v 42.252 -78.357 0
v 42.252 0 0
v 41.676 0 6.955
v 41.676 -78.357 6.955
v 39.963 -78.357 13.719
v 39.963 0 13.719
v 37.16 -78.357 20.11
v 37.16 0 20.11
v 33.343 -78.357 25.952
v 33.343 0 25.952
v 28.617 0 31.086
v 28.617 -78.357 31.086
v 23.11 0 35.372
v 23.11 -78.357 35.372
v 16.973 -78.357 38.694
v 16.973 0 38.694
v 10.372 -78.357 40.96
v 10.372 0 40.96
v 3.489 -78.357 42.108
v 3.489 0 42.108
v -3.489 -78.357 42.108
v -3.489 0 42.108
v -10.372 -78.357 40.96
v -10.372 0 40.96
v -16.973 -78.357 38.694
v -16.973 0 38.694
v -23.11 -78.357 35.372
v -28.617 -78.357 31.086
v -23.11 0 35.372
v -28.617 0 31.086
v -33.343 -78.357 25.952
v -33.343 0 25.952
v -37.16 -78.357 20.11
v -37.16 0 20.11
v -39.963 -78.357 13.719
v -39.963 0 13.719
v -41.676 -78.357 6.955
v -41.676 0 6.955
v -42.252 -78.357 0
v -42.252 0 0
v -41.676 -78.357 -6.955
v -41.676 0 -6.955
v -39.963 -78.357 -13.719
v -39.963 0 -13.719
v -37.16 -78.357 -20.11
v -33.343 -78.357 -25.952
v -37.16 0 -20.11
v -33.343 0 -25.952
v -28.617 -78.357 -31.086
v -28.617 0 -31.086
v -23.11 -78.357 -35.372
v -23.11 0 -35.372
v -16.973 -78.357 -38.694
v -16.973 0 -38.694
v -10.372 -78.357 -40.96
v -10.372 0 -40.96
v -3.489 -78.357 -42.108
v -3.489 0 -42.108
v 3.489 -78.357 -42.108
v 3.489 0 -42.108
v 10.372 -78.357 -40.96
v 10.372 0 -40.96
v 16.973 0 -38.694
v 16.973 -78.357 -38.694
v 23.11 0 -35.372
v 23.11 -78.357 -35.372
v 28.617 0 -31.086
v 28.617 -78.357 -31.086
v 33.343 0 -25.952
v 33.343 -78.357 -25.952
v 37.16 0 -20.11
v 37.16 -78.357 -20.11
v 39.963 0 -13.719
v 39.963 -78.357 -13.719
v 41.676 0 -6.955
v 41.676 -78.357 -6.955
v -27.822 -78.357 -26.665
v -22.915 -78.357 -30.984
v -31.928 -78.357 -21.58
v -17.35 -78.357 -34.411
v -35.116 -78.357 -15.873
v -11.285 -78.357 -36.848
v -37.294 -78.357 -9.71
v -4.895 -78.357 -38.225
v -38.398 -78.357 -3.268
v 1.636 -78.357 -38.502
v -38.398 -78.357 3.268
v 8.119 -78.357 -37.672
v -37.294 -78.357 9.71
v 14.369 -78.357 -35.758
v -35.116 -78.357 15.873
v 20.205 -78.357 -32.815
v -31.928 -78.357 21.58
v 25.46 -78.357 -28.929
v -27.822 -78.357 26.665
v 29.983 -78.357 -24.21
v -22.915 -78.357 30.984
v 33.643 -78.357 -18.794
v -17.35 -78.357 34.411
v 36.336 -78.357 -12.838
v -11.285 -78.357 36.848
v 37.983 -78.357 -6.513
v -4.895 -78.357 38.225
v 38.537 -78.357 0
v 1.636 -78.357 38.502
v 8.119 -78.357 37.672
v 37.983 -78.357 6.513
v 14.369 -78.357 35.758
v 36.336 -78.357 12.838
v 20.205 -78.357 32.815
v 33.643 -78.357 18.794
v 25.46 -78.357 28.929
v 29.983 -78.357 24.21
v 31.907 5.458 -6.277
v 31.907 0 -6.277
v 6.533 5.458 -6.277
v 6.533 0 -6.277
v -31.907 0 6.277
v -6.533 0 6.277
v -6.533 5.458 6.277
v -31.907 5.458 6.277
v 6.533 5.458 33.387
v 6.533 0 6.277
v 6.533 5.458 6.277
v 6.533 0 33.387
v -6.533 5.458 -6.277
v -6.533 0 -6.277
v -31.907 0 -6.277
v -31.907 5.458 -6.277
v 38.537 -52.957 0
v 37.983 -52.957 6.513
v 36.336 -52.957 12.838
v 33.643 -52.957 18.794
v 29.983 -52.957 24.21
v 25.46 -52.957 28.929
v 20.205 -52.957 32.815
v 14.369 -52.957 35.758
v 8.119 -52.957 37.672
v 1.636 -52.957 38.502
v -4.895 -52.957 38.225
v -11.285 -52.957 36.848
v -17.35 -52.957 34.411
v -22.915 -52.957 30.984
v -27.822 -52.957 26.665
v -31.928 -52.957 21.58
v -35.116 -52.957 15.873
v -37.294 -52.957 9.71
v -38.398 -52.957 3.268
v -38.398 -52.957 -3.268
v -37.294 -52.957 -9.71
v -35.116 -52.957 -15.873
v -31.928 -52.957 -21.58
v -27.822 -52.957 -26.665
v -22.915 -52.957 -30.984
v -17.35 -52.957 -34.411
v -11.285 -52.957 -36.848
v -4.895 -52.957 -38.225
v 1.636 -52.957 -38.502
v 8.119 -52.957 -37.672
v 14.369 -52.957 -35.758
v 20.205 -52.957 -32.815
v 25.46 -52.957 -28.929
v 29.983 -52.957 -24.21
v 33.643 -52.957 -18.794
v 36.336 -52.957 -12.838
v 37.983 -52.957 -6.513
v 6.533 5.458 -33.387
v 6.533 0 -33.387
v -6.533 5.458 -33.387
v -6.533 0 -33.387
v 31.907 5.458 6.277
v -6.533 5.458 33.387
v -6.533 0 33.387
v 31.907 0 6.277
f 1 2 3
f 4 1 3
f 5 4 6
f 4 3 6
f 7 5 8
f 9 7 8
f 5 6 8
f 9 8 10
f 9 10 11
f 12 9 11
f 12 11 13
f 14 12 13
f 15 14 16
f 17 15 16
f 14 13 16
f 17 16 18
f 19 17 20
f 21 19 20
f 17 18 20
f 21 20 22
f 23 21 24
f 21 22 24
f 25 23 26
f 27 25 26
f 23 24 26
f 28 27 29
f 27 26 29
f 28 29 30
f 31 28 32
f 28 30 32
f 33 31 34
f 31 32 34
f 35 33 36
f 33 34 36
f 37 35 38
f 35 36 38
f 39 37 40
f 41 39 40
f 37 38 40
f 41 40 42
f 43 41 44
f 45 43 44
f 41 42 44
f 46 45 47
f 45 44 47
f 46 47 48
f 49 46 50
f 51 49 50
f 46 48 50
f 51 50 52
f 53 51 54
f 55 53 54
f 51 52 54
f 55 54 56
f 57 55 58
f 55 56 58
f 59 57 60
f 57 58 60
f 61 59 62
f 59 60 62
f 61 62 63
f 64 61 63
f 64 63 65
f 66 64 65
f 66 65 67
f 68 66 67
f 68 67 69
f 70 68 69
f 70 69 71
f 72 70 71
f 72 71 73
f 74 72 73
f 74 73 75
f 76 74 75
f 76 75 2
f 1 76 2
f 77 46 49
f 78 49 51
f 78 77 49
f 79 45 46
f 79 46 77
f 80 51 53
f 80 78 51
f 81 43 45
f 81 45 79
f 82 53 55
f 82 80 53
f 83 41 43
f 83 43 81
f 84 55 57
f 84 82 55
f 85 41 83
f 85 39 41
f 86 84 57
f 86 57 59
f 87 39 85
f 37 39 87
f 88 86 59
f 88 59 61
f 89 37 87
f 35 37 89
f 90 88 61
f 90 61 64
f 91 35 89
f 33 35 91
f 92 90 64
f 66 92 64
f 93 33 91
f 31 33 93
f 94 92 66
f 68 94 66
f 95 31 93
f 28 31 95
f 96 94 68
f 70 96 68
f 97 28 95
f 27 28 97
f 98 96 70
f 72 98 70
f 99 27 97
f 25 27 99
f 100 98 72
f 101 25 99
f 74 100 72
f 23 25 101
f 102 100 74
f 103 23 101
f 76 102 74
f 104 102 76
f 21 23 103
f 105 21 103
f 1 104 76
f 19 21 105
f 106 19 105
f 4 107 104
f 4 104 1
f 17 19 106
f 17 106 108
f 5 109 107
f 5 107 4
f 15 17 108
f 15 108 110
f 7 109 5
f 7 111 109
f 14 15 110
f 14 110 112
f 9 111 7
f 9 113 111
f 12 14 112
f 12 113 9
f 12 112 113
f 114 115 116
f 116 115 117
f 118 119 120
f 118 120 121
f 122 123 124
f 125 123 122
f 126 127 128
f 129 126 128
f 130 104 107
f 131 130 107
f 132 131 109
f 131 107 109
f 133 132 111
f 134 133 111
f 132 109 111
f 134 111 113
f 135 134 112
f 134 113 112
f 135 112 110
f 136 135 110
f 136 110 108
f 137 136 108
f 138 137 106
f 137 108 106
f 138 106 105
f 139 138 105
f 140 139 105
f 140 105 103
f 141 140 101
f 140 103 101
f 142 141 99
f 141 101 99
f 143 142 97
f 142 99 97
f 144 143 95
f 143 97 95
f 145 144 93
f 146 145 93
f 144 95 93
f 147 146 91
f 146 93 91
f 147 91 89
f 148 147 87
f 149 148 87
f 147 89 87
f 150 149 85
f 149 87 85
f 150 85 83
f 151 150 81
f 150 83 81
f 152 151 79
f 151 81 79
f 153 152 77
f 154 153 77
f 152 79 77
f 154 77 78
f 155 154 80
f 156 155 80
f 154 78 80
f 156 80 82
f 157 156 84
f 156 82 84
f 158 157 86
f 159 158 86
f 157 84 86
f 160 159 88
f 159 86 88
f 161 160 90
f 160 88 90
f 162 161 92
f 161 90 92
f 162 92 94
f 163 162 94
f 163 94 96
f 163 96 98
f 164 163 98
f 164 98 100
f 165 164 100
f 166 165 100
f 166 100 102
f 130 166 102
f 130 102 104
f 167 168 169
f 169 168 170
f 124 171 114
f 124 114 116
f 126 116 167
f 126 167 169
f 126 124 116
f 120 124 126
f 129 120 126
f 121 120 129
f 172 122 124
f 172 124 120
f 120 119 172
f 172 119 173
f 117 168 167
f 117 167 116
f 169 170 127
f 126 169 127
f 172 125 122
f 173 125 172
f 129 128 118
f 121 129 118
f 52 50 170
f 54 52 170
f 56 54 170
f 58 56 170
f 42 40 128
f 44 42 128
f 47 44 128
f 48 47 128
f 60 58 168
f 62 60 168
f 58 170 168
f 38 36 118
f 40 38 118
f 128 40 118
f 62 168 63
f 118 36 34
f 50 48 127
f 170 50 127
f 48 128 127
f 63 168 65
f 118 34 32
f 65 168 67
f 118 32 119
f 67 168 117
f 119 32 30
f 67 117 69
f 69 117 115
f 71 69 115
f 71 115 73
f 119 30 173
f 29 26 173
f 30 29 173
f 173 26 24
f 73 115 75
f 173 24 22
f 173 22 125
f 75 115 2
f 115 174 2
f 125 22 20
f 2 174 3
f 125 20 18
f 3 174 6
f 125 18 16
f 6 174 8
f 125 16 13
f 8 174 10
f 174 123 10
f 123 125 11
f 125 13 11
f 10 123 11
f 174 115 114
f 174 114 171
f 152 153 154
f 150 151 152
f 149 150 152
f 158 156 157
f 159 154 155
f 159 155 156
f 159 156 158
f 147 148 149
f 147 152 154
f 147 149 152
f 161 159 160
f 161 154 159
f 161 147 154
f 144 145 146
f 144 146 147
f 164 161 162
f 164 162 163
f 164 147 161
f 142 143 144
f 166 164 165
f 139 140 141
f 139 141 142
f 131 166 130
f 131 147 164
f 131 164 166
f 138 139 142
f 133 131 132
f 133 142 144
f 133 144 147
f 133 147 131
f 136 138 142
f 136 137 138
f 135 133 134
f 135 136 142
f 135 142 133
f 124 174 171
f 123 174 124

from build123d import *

# Parameters (mm, degrees)
F1_DEPTH = 78.3572047949
F2_R     = 38.5370833617
F3_DEPTH = 25.4
F5_W     = 13.0668841302
F5_H     = 27.1093435585
F5_W_2   = 25.3738258034
F5_H_2   = 12.5543624163
F6_DEPTH = 5.4576825351


with BuildPart() as f1:
    # F0 (on Front) → F1 (new body)
    with BuildSketch(Plane.XZ):
        with BuildLine():
            ThreePointArc((0, 42.2524884343), (-29.8770210939, -29.8770210939), (42.2524884343, 0))
            ThreePointArc((42.2524884343, 0), (29.8770210939, 29.8770210939), (0, 42.2524884343))
        make_face()
    extrude(amount=F1_DEPTH)

    # F2 (on face) → F3 (cut)
    with BuildSketch(Plane.XZ.offset(78.3572047949)):
        Circle(F2_R)
    extrude(amount=-F3_DEPTH, mode=Mode.SUBTRACT)

    # F5 (on face) → F6 (join)
    with BuildSketch(Plane(origin=(0, 0, 0), x_dir=(-1, 0, 0), z_dir=(0, 1, 0))):
        with Locations((0, 19.8318529874)):
            Rectangle(F5_W, F5_H)
        with Locations((19.2203549668, 0)):
            Rectangle(F5_W_2, F5_H_2)
        with Locations((0, -19.8318529874)):
            Rectangle(F5_W, F5_H)
        with Locations((-19.2203549668, 0)):
            Rectangle(F5_W_2, F5_H_2)
        Rectangle(F5_W, F5_H_2)
    extrude(amount=F6_DEPTH)


solid = f1.part
